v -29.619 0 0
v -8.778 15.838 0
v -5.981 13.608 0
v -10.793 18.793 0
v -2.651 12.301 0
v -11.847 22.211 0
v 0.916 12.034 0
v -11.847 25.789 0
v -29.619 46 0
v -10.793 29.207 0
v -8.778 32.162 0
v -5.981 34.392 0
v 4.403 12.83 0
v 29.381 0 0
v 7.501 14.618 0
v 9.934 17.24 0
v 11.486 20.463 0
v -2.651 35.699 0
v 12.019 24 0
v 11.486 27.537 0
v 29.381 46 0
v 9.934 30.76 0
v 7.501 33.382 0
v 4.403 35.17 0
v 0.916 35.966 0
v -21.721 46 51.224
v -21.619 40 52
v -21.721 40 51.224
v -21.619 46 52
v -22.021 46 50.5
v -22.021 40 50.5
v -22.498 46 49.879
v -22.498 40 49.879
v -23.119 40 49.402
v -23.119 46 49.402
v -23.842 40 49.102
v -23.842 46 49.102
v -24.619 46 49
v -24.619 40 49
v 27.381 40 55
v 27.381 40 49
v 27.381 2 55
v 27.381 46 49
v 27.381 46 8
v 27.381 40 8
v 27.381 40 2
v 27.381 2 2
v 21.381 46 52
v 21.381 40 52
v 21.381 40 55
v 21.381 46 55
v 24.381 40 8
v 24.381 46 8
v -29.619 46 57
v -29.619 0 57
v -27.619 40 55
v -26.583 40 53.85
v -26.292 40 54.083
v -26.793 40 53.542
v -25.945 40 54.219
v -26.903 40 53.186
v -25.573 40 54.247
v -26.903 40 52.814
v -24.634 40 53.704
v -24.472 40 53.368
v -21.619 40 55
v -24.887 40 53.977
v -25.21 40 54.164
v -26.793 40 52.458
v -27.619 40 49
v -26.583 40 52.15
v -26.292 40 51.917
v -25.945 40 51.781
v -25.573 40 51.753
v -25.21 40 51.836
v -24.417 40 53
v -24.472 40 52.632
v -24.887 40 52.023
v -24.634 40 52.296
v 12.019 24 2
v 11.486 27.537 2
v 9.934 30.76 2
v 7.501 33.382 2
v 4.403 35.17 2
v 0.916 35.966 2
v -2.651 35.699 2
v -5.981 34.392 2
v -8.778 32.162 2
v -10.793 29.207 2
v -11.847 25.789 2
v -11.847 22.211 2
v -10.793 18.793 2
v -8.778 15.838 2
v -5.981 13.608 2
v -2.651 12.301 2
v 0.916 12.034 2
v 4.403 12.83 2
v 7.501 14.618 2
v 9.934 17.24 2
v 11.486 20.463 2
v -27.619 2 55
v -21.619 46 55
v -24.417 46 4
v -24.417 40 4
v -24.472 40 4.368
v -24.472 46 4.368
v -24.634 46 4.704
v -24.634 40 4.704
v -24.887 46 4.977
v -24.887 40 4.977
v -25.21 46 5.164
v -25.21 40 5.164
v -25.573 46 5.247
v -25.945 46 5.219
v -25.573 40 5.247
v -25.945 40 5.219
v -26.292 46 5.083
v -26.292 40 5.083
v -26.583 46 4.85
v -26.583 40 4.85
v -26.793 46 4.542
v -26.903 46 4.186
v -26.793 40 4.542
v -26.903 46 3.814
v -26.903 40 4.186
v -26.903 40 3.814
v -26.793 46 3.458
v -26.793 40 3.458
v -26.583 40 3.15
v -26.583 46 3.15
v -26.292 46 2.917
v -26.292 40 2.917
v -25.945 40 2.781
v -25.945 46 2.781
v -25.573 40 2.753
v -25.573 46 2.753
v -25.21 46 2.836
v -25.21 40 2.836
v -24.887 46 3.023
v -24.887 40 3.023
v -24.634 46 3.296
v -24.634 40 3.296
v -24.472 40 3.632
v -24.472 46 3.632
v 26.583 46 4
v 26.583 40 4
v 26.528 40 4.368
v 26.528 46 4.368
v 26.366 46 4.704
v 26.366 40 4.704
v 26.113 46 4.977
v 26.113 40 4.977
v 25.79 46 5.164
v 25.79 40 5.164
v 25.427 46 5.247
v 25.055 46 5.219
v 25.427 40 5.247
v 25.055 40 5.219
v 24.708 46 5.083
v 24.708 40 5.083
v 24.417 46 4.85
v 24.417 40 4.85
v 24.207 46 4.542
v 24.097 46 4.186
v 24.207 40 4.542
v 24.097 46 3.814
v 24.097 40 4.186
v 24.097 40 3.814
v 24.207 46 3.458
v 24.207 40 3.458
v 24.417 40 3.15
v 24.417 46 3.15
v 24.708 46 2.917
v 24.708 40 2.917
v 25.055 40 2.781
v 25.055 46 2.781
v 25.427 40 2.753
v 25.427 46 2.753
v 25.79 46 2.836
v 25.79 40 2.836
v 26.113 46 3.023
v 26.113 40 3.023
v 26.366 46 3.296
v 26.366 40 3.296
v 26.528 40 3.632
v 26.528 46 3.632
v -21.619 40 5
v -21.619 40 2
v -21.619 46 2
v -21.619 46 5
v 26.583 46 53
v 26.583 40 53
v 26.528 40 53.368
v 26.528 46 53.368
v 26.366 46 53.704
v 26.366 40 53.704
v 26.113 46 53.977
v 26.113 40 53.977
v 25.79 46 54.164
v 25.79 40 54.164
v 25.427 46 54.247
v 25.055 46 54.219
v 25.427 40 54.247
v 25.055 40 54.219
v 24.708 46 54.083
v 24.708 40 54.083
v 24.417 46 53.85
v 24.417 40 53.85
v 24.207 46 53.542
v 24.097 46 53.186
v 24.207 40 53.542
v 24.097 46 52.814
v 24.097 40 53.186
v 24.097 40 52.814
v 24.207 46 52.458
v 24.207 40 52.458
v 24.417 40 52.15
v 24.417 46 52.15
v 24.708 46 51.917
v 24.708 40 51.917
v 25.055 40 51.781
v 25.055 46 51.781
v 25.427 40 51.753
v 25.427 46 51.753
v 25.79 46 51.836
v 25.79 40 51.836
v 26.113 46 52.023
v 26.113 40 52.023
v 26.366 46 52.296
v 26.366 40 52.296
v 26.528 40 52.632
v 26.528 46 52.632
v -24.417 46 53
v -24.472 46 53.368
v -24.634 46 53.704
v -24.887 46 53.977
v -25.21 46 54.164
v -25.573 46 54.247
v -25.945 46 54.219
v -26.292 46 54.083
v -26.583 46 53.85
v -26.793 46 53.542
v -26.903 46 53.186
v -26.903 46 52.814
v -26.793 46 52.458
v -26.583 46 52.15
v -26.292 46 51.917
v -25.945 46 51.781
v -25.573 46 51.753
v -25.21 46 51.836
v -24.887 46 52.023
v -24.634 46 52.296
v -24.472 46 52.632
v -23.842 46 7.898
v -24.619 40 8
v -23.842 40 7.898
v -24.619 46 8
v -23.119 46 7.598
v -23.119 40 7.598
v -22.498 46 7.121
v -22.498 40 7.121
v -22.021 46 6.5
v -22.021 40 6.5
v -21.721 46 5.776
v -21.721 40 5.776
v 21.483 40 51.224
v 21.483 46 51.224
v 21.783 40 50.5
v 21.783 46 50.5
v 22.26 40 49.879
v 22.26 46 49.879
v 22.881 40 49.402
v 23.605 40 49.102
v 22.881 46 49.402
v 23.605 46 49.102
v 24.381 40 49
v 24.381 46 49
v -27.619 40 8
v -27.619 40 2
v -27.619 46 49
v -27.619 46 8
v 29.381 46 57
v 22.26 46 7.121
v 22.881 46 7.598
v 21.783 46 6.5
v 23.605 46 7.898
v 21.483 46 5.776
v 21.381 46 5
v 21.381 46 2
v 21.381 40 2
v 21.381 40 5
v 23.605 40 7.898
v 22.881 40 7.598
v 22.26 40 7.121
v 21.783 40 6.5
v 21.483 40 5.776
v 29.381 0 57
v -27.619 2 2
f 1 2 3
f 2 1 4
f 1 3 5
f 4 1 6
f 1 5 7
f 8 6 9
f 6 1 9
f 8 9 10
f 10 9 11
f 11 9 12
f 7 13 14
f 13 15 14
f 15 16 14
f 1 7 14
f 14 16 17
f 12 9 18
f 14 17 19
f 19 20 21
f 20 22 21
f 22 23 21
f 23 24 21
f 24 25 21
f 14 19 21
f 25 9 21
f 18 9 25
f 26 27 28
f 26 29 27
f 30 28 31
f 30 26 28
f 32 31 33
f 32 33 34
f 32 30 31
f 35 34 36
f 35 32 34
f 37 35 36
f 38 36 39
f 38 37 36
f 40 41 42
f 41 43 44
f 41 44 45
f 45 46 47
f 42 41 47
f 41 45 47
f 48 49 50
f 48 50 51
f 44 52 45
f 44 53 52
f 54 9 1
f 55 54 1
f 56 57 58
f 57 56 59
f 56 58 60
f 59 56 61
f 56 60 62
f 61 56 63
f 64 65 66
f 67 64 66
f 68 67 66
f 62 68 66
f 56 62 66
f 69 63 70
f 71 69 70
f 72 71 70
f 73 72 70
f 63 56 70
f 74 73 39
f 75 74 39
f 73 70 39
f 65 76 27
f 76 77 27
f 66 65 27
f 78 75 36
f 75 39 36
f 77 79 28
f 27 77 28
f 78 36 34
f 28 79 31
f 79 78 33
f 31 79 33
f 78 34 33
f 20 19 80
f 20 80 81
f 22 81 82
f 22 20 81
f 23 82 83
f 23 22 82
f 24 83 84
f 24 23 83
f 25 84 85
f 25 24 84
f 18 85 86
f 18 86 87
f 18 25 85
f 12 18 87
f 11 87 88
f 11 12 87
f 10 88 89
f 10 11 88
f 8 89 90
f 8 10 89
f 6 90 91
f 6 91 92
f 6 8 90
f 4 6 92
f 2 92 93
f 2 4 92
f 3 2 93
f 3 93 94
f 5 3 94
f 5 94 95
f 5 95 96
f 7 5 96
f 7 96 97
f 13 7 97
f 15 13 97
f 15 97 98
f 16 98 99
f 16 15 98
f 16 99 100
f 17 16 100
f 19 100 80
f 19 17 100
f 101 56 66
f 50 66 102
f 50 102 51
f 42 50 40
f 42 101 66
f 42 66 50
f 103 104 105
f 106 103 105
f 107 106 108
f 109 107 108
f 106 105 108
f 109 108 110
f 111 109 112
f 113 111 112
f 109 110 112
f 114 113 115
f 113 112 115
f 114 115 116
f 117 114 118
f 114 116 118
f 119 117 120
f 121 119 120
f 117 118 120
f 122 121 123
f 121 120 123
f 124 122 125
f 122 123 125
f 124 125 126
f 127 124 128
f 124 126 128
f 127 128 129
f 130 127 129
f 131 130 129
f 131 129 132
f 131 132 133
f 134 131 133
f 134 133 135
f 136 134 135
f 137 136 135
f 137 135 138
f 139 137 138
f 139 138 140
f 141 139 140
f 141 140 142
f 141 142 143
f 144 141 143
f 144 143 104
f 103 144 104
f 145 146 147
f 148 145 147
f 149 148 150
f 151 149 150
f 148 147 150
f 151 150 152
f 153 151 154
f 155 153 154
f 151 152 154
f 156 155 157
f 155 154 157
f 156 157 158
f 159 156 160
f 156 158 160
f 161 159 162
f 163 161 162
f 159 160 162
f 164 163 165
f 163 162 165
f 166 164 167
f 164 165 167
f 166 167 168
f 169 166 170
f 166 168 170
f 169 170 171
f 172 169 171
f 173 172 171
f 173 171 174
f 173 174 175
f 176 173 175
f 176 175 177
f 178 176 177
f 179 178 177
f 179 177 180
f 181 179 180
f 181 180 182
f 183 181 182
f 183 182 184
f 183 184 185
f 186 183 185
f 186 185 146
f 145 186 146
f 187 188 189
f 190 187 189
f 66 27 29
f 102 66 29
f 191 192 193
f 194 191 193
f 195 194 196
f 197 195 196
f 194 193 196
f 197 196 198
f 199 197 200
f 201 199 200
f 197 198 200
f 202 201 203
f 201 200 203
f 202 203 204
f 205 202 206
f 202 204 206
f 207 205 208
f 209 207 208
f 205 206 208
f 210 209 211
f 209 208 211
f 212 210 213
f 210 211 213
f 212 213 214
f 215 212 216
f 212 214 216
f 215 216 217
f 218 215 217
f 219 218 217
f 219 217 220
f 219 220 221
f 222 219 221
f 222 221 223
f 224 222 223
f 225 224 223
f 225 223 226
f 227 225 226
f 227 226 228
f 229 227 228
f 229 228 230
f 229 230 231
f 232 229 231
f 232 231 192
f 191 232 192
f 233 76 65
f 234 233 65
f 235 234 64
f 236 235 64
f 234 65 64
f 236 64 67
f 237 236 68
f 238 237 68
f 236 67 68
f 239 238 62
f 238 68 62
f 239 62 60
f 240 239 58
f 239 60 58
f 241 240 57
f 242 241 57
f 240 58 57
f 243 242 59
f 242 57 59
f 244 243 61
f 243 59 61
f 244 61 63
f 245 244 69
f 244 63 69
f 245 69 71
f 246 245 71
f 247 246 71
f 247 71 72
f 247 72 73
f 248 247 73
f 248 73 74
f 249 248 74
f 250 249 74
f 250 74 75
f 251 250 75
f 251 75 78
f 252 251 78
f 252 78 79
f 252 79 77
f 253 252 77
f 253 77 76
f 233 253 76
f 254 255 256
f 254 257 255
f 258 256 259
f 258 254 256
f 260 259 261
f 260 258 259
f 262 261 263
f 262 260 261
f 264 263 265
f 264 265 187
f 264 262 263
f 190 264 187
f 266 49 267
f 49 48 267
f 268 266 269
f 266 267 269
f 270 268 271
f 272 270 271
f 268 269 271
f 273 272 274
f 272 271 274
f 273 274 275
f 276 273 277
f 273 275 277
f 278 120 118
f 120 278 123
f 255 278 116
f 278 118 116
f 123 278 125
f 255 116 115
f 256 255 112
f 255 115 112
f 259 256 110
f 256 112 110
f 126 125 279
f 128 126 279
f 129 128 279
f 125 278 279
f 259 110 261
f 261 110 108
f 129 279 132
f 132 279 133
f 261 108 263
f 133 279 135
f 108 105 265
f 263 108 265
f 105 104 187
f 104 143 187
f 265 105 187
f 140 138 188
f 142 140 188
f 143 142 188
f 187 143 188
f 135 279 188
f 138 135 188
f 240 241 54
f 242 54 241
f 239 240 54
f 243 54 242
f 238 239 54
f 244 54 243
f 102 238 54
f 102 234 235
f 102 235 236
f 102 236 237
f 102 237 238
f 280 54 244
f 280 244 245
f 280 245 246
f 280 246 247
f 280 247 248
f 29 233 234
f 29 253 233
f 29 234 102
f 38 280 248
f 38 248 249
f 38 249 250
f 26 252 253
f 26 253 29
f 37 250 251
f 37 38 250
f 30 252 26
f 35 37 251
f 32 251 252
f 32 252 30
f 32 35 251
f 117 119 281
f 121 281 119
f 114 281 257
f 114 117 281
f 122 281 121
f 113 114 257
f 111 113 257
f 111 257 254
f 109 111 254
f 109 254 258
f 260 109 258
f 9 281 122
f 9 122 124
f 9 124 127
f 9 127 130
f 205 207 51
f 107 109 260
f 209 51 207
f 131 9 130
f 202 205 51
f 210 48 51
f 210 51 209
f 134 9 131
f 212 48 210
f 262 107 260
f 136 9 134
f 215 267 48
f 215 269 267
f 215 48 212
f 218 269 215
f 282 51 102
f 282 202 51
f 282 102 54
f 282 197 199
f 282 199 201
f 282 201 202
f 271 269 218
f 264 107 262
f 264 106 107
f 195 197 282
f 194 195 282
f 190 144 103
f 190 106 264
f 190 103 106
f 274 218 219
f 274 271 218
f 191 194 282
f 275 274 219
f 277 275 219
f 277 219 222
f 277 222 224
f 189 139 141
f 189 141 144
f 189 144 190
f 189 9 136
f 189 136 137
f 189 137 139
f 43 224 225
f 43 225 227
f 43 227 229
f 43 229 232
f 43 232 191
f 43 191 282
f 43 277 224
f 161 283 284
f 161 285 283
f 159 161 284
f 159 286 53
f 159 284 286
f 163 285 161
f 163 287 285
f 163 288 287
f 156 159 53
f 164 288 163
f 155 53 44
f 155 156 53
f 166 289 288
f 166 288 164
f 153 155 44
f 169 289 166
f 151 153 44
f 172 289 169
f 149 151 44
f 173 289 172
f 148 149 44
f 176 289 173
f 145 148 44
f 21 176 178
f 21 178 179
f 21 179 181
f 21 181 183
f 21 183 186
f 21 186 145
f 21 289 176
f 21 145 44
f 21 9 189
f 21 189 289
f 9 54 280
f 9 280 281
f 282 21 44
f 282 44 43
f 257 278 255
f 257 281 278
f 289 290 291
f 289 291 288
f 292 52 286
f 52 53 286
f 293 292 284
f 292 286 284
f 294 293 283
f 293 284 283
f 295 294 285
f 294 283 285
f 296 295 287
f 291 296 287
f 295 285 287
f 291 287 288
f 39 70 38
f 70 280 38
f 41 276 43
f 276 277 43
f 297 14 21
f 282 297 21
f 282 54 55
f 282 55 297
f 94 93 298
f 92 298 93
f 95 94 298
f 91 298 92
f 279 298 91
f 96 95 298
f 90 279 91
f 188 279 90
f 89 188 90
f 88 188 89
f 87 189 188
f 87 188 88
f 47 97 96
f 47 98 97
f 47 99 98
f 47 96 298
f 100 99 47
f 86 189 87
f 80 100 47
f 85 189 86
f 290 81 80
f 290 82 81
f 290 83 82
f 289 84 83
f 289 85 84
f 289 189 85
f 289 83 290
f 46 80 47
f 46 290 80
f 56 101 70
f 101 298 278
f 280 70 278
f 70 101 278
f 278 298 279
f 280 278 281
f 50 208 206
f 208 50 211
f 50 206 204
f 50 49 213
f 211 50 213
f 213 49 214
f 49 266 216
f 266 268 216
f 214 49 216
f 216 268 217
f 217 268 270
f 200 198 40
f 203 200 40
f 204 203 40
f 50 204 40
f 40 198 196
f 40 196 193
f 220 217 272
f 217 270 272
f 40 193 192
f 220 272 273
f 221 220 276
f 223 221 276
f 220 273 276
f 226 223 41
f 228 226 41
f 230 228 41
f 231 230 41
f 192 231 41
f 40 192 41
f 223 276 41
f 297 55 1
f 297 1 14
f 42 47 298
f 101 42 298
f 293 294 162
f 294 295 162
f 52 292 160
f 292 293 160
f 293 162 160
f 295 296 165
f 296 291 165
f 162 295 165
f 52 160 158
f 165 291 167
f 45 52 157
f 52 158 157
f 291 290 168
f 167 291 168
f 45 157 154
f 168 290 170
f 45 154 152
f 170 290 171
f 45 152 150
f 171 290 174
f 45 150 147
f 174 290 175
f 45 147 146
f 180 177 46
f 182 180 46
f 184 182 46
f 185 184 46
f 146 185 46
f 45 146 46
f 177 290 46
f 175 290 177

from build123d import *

# Parameters (mm, degrees)
F0_R     = 12
F0_W     = 6
F0_H     = 6
F1_DEPTH = 2
F2_DEPTH = 57
F3_W     = 55
F3_H     = 2
F4_DEPTH = 46
F5_DEPTH = 8
F6_START = 49
F6_DEPTH = 6
F8_START = -28.2
F7_R     = 1.25
F8_DEPTH = 30.8
F9_R     = 3


with BuildPart() as f1:
    # F0 (on Top) → F1 (new body)
    with BuildSketch(Plane.XY):
        Polygon((-27.6188791469, 46), (-29.6188791469, 46), (-29.6188791469, 0), (29.3811208531, 0), (29.3811208531, 46), (27.3811208531, 46), (27.3811208531, 40), (27.3811208531, 2), (-27.6188791469, 2), (-27.6188791469, 40), align=None)
        Polygon((21.3811208531, 46), (-21.6188791469, 46), (-21.6188791469, 40), (-27.6188791469, 40), (-27.6188791469, 2), (27.3811208531, 2), (27.3811208531, 40), (21.3811208531, 40), align=None)
        with Locations((0.0188835789, 24)):
            Circle(F0_R, mode=Mode.SUBTRACT)
        with Locations((-24.6188791469, 43)):
            Rectangle(F0_W, F0_H)
        with Locations((24.3811208531, 43)):
            Rectangle(F0_W, F0_H)
    extrude(amount=F1_DEPTH)

    # F0 (on Top) → F2 (join)
    with BuildSketch(Plane.XY):
        Polygon((-27.6188791469, 46), (-29.6188791469, 46), (-29.6188791469, 0), (29.3811208531, 0), (29.3811208531, 46), (27.3811208531, 46), (27.3811208531, 40), (27.3811208531, 2), (-27.6188791469, 2), (-27.6188791469, 40), align=None)
    extrude(amount=F2_DEPTH)

    # F3 (on Front) → F4 (join)
    with BuildSketch(Plane.XZ):
        with Locations((-0.1188791469, 56)):
            Rectangle(F3_W, F3_H)
    extrude(amount=-F4_DEPTH)

    # F0 (on Top) → F5 (join)
    with BuildSketch(Plane.XY):
        with Locations((24.3811208531, 43)):
            Rectangle(F0_W, F0_H)
        with Locations((-24.6188791469, 43)):
            Rectangle(F0_W, F0_H)
    extrude(amount=F5_DEPTH)

    # F0 (on Top) → F6 (join)
    with BuildSketch(Plane.XY.offset(F6_START)):
        with Locations((24.3811208531, 43)):
            Rectangle(F0_W, F0_H)
        with Locations((-24.6188791469, 43)):
            Rectangle(F0_W, F0_H)
    extrude(amount=F6_DEPTH)

    # F7 (on Front) → F8 (cut)
    with BuildSketch(Plane.XZ.offset(F8_START)):
        with Locations((25.3331962228, 53)):
            Circle(F7_R)
        with Locations((-25.6668037772, 53)):
            Circle(F7_R)
        with Locations((-25.6668037772, 4)):
            Circle(F7_R)
        with Locations((25.3331962228, 4)):
            Circle(F7_R)
    extrude(amount=-F8_DEPTH, mode=Mode.SUBTRACT)

    # F9
    f9_edges = [f1.edges().sort_by_distance(p)[0] for p in [
        (21.381121, 43, 49),
        (-21.618879, 43, 49),
        (-21.618879, 43, 8),
        (21.381121, 43, 8),
    ]]
    fillet(f9_edges, radius=F9_R)


solid = f1.part
